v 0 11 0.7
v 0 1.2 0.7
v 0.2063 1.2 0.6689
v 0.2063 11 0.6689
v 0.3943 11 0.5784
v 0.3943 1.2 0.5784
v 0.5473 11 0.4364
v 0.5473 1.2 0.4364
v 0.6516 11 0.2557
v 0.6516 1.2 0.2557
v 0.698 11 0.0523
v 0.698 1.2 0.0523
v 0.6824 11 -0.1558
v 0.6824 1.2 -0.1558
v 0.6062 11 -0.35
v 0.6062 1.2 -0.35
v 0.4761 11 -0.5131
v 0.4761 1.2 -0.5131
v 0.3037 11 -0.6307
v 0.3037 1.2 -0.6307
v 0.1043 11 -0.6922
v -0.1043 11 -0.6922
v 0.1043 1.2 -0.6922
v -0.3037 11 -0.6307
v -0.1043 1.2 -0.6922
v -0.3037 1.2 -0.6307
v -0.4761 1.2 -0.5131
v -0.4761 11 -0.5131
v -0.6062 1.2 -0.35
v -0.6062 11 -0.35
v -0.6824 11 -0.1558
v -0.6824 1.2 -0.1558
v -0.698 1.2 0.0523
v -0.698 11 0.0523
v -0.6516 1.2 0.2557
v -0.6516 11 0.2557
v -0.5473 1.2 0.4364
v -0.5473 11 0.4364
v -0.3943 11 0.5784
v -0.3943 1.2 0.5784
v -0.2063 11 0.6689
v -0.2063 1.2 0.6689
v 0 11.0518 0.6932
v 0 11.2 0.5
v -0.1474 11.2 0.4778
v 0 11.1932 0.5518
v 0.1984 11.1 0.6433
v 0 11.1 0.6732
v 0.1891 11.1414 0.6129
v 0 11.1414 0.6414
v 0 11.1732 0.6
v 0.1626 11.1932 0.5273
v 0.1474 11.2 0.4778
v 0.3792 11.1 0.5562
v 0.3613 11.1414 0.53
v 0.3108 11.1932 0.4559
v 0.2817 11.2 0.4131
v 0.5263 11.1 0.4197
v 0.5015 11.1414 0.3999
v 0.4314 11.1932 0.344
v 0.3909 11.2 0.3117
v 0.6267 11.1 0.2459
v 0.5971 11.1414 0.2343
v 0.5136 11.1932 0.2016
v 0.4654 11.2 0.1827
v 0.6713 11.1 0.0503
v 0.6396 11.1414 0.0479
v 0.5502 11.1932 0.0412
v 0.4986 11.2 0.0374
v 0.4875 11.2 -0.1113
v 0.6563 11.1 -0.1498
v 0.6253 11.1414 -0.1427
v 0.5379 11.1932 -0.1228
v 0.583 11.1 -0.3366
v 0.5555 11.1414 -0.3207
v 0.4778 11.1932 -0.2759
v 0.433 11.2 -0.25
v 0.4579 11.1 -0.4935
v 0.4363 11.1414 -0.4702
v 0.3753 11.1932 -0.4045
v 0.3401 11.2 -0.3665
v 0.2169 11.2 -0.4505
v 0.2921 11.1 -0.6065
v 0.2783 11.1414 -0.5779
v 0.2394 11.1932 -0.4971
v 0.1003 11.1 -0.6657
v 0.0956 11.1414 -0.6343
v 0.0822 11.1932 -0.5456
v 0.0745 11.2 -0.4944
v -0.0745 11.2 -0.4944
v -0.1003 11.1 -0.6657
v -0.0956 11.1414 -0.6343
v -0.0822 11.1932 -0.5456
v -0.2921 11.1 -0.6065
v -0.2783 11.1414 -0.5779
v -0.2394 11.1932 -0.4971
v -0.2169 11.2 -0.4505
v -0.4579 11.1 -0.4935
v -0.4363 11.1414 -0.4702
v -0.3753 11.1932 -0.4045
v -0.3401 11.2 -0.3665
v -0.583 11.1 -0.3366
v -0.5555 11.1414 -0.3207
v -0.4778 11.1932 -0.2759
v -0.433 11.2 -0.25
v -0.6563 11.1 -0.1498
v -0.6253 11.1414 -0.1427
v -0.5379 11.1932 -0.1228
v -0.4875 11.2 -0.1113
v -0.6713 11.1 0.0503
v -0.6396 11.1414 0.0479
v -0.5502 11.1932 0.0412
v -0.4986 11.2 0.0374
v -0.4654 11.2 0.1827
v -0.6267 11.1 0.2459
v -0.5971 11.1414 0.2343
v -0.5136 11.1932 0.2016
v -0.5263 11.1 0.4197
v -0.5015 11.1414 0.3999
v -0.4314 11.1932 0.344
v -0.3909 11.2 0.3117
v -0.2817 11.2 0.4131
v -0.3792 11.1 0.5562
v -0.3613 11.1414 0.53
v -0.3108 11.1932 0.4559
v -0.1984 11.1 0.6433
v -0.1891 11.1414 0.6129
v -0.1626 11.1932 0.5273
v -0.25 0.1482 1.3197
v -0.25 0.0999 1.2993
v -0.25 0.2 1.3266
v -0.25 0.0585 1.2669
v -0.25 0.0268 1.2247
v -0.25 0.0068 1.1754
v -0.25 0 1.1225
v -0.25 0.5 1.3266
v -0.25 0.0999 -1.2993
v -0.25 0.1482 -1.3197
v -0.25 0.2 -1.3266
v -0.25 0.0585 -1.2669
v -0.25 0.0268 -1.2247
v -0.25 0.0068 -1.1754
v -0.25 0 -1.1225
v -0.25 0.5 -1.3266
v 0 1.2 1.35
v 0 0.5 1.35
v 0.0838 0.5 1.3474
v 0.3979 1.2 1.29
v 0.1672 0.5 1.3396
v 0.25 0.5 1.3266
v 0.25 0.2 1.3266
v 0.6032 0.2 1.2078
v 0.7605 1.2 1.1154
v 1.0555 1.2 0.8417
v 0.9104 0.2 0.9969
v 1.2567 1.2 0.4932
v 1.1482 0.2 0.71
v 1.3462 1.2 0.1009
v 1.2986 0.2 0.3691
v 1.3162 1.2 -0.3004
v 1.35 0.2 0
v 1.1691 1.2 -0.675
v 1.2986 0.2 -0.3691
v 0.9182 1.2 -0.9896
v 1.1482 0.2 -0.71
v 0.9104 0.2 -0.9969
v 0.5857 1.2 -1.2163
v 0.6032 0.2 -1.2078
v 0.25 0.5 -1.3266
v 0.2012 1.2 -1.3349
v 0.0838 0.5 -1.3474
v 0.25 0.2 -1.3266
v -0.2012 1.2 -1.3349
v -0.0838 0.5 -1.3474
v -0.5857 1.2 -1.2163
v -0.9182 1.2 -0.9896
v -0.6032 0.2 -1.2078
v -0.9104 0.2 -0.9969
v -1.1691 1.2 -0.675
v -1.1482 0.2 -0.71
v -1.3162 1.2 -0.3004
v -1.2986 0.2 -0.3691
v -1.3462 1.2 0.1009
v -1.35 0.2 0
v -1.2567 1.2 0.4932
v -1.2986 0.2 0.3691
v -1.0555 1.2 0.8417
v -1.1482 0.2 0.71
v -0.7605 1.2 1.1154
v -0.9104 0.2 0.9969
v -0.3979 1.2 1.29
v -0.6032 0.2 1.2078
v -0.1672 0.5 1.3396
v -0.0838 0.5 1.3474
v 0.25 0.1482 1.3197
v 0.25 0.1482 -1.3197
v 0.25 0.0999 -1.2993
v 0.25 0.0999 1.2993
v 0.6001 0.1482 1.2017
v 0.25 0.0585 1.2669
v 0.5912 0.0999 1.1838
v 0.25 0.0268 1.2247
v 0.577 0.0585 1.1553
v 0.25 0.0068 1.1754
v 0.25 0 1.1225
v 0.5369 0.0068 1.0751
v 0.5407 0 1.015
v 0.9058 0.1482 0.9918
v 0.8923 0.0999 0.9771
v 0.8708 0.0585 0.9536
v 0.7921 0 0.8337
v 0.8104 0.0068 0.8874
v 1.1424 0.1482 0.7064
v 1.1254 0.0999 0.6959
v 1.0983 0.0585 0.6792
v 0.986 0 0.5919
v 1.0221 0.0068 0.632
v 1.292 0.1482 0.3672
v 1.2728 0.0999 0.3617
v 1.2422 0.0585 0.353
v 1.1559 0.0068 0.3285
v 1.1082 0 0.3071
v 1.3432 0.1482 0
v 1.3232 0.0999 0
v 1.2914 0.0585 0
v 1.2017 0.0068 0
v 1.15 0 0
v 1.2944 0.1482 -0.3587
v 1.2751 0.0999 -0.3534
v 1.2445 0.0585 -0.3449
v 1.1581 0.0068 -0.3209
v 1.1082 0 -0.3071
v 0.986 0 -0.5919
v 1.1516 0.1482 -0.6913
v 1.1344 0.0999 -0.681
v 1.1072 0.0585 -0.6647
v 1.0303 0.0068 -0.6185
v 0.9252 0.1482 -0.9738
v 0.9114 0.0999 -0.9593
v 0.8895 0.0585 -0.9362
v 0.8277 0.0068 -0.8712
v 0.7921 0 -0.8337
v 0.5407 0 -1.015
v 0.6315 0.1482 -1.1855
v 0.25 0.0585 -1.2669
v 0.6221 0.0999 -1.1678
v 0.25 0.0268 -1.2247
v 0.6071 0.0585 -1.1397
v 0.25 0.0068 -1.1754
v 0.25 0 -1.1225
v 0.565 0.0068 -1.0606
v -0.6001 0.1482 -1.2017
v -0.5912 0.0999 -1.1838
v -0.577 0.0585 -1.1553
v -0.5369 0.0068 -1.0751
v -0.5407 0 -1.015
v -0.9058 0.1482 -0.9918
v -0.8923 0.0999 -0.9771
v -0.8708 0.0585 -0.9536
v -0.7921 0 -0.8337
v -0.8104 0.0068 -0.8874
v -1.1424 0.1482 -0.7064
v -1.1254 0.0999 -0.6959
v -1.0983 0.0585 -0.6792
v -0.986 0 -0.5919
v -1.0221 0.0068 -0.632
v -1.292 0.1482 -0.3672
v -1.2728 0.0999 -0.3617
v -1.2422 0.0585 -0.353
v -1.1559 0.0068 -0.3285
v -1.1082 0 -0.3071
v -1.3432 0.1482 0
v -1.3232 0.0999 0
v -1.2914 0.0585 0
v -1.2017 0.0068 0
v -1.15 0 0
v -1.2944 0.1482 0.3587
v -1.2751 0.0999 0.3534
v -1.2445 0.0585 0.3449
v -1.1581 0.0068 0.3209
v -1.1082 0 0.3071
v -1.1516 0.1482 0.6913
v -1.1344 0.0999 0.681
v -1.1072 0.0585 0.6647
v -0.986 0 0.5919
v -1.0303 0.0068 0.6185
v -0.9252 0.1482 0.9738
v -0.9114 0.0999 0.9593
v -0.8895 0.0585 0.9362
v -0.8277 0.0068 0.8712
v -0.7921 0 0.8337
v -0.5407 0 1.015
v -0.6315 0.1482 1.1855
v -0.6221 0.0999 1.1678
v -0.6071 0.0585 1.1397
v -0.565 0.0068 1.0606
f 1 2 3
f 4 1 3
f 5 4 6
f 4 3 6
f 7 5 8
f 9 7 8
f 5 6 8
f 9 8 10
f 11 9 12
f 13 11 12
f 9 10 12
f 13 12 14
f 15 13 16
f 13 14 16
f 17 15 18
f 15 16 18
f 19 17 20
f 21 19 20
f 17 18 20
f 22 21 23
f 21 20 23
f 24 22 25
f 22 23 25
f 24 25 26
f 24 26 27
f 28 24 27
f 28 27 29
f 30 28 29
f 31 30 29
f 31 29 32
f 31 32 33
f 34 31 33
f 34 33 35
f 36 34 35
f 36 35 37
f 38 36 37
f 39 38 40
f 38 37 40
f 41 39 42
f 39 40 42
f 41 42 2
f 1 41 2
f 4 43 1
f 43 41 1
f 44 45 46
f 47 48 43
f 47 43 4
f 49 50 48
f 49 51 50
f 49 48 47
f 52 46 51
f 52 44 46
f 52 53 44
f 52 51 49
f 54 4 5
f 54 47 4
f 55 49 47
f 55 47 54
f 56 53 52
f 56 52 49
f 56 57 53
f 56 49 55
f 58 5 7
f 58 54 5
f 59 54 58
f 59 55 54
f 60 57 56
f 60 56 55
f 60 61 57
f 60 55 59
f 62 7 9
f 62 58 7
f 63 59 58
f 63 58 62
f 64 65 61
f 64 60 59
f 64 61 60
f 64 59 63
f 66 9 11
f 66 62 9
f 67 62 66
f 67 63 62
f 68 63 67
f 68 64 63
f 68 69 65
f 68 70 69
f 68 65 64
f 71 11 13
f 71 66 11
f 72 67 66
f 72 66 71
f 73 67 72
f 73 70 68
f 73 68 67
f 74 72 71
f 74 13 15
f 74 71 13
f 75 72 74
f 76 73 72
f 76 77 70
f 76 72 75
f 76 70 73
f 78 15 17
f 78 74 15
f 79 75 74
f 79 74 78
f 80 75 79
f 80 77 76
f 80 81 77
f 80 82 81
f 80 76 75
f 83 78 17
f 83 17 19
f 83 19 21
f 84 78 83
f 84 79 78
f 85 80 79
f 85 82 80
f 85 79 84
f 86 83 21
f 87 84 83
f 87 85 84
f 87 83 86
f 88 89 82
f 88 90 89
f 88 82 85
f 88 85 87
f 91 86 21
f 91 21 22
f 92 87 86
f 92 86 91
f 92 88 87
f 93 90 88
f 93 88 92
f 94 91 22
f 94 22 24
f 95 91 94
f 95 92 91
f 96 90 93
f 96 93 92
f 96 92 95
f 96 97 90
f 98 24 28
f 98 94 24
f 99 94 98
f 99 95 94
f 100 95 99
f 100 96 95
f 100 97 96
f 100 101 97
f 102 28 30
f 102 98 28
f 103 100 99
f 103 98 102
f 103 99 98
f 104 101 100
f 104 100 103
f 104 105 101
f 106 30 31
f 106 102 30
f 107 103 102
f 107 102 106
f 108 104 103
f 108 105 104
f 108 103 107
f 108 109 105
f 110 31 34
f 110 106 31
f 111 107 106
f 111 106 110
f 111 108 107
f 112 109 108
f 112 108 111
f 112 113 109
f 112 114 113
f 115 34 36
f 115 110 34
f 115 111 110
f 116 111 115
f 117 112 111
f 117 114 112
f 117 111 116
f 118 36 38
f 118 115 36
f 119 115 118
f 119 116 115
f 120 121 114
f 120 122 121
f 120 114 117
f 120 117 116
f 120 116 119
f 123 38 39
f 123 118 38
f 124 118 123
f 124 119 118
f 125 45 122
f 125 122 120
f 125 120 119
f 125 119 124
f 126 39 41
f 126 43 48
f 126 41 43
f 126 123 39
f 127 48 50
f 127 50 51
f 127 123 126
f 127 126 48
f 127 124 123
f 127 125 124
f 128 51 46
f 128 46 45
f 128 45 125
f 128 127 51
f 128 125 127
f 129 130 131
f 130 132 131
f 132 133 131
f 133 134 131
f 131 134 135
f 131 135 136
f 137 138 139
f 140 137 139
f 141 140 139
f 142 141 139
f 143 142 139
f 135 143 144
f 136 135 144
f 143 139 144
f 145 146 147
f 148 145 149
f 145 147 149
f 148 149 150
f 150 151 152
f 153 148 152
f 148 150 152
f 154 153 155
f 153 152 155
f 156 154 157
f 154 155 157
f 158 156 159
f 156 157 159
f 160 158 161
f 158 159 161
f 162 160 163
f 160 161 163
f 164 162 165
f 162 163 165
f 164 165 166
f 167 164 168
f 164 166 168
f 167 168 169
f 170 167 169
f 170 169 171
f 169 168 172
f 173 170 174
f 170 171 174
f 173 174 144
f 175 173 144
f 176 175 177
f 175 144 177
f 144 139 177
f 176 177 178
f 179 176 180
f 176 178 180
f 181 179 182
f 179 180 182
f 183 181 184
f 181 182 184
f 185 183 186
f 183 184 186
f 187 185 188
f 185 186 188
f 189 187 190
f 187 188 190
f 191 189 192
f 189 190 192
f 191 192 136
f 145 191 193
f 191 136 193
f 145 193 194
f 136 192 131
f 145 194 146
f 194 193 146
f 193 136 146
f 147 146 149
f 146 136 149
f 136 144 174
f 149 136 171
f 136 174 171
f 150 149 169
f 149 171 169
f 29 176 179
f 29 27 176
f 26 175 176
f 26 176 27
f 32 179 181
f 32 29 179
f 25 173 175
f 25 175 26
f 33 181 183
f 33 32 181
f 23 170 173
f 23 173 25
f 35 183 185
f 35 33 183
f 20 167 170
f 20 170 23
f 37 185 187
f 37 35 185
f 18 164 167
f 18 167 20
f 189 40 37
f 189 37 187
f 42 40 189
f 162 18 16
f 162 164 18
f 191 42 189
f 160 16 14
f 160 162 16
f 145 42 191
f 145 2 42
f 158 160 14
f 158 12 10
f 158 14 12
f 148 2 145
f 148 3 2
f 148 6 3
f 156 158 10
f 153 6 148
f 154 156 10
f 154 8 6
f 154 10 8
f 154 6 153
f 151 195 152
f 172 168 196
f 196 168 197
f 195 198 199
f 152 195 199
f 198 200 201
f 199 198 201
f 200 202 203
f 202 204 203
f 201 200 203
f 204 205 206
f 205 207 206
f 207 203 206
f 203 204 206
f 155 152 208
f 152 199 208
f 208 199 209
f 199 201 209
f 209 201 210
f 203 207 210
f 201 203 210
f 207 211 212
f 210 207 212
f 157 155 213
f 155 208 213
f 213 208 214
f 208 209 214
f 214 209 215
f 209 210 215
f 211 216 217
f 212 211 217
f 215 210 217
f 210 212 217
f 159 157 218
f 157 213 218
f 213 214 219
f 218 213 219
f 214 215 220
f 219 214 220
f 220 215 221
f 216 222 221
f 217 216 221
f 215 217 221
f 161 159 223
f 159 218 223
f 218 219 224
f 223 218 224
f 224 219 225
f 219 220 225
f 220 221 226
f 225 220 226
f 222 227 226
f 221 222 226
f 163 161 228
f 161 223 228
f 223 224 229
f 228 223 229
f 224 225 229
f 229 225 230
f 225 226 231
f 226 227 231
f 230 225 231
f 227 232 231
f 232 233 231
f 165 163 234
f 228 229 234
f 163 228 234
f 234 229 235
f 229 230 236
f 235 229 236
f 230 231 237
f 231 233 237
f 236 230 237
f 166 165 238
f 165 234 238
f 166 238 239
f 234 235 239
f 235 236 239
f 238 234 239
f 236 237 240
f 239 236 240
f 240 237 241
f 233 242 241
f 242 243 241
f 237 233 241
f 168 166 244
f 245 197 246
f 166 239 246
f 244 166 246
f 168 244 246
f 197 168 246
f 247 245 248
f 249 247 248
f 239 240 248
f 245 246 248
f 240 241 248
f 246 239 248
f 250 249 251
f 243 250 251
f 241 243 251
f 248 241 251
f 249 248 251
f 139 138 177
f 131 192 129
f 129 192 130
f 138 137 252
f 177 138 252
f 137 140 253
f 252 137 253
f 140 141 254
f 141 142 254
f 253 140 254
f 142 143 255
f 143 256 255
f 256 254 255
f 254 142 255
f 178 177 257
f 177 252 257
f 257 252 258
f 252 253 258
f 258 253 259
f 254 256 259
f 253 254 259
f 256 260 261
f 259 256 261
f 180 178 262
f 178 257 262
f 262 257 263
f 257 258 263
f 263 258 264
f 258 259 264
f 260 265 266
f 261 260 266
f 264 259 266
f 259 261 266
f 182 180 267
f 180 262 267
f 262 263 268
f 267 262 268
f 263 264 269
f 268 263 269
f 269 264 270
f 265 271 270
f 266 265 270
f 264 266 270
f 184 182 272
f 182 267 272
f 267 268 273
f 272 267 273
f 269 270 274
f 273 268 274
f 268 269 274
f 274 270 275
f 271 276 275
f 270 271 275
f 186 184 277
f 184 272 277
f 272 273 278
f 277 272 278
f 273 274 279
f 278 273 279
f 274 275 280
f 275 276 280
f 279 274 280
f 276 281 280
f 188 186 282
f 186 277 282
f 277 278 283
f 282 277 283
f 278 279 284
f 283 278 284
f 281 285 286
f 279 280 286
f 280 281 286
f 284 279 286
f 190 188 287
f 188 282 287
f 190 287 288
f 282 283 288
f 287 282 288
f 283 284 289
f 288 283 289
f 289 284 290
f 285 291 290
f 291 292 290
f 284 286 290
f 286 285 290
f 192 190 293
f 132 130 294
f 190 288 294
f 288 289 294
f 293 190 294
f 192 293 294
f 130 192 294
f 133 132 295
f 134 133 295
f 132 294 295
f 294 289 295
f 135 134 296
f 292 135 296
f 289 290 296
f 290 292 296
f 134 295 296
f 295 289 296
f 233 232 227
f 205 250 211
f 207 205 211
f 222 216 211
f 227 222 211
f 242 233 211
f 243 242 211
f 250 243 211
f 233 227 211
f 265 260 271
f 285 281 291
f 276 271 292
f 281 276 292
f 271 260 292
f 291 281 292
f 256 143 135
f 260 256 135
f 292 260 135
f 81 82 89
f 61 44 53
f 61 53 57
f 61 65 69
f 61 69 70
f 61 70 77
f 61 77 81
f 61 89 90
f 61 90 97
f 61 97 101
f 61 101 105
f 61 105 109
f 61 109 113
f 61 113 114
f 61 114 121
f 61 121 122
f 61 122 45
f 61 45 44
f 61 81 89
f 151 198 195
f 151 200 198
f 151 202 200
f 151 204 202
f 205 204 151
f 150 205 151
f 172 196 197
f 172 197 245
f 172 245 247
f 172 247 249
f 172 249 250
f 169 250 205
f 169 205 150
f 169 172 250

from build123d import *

# Parameters (mm, degrees)
SKETCH2_R               = 1.35
BOSS_EXTRUDE1_DEPTH     = 1.2
SKETCH3_R               = 0.7
BOSS_EXTRUDE2_DEPTH     = 10
CUT_EXTRUDE1_DEPTH      = 10
CUT_EXTRUDE1_DEPTH_BACK = 10
SKETCH4_W               = 0.5
SKETCH4_H               = 0.5
FILLET1_R               = 0.2


with BuildPart() as part:
    # Sketch2 → Boss-Extrude1 (new body)
    with BuildSketch(Plane(origin=(0, 0, 0), x_dir=(1, 0, 0), z_dir=(0, 1, 0))):
        Circle(SKETCH2_R)
    extrude(amount=BOSS_EXTRUDE1_DEPTH)

    # Sketch3 → Boss-Extrude2 (add)
    with BuildSketch(Plane(origin=(0, 1.2, 0), x_dir=(1, 0, 0), z_dir=(0, 1, 0))):
        Circle(SKETCH3_R)
    extrude(amount=BOSS_EXTRUDE2_DEPTH)

    # Sketch4 → Cut-Extrude1 (cut, two sides: drawn at the far end of the back side and taken through both)
    with BuildSketch(Plane.XY.offset(-CUT_EXTRUDE1_DEPTH_BACK)):
        with Locations((0, 0.25)):
            Rectangle(SKETCH4_W, SKETCH4_H)
    extrude(amount=CUT_EXTRUDE1_DEPTH + CUT_EXTRUDE1_DEPTH_BACK, mode=Mode.SUBTRACT)

    # Fillet1
    fillet1_edges = [part.edges().sort_by_distance(p)[0] for p in [
        (1.039230485, 0, 0.861684397),
        (-1.35, 0, 0),
        (-0.7, 11.2, 0),
    ]]
    fillet(fillet1_edges, radius=FILLET1_R)


solid = part.part
